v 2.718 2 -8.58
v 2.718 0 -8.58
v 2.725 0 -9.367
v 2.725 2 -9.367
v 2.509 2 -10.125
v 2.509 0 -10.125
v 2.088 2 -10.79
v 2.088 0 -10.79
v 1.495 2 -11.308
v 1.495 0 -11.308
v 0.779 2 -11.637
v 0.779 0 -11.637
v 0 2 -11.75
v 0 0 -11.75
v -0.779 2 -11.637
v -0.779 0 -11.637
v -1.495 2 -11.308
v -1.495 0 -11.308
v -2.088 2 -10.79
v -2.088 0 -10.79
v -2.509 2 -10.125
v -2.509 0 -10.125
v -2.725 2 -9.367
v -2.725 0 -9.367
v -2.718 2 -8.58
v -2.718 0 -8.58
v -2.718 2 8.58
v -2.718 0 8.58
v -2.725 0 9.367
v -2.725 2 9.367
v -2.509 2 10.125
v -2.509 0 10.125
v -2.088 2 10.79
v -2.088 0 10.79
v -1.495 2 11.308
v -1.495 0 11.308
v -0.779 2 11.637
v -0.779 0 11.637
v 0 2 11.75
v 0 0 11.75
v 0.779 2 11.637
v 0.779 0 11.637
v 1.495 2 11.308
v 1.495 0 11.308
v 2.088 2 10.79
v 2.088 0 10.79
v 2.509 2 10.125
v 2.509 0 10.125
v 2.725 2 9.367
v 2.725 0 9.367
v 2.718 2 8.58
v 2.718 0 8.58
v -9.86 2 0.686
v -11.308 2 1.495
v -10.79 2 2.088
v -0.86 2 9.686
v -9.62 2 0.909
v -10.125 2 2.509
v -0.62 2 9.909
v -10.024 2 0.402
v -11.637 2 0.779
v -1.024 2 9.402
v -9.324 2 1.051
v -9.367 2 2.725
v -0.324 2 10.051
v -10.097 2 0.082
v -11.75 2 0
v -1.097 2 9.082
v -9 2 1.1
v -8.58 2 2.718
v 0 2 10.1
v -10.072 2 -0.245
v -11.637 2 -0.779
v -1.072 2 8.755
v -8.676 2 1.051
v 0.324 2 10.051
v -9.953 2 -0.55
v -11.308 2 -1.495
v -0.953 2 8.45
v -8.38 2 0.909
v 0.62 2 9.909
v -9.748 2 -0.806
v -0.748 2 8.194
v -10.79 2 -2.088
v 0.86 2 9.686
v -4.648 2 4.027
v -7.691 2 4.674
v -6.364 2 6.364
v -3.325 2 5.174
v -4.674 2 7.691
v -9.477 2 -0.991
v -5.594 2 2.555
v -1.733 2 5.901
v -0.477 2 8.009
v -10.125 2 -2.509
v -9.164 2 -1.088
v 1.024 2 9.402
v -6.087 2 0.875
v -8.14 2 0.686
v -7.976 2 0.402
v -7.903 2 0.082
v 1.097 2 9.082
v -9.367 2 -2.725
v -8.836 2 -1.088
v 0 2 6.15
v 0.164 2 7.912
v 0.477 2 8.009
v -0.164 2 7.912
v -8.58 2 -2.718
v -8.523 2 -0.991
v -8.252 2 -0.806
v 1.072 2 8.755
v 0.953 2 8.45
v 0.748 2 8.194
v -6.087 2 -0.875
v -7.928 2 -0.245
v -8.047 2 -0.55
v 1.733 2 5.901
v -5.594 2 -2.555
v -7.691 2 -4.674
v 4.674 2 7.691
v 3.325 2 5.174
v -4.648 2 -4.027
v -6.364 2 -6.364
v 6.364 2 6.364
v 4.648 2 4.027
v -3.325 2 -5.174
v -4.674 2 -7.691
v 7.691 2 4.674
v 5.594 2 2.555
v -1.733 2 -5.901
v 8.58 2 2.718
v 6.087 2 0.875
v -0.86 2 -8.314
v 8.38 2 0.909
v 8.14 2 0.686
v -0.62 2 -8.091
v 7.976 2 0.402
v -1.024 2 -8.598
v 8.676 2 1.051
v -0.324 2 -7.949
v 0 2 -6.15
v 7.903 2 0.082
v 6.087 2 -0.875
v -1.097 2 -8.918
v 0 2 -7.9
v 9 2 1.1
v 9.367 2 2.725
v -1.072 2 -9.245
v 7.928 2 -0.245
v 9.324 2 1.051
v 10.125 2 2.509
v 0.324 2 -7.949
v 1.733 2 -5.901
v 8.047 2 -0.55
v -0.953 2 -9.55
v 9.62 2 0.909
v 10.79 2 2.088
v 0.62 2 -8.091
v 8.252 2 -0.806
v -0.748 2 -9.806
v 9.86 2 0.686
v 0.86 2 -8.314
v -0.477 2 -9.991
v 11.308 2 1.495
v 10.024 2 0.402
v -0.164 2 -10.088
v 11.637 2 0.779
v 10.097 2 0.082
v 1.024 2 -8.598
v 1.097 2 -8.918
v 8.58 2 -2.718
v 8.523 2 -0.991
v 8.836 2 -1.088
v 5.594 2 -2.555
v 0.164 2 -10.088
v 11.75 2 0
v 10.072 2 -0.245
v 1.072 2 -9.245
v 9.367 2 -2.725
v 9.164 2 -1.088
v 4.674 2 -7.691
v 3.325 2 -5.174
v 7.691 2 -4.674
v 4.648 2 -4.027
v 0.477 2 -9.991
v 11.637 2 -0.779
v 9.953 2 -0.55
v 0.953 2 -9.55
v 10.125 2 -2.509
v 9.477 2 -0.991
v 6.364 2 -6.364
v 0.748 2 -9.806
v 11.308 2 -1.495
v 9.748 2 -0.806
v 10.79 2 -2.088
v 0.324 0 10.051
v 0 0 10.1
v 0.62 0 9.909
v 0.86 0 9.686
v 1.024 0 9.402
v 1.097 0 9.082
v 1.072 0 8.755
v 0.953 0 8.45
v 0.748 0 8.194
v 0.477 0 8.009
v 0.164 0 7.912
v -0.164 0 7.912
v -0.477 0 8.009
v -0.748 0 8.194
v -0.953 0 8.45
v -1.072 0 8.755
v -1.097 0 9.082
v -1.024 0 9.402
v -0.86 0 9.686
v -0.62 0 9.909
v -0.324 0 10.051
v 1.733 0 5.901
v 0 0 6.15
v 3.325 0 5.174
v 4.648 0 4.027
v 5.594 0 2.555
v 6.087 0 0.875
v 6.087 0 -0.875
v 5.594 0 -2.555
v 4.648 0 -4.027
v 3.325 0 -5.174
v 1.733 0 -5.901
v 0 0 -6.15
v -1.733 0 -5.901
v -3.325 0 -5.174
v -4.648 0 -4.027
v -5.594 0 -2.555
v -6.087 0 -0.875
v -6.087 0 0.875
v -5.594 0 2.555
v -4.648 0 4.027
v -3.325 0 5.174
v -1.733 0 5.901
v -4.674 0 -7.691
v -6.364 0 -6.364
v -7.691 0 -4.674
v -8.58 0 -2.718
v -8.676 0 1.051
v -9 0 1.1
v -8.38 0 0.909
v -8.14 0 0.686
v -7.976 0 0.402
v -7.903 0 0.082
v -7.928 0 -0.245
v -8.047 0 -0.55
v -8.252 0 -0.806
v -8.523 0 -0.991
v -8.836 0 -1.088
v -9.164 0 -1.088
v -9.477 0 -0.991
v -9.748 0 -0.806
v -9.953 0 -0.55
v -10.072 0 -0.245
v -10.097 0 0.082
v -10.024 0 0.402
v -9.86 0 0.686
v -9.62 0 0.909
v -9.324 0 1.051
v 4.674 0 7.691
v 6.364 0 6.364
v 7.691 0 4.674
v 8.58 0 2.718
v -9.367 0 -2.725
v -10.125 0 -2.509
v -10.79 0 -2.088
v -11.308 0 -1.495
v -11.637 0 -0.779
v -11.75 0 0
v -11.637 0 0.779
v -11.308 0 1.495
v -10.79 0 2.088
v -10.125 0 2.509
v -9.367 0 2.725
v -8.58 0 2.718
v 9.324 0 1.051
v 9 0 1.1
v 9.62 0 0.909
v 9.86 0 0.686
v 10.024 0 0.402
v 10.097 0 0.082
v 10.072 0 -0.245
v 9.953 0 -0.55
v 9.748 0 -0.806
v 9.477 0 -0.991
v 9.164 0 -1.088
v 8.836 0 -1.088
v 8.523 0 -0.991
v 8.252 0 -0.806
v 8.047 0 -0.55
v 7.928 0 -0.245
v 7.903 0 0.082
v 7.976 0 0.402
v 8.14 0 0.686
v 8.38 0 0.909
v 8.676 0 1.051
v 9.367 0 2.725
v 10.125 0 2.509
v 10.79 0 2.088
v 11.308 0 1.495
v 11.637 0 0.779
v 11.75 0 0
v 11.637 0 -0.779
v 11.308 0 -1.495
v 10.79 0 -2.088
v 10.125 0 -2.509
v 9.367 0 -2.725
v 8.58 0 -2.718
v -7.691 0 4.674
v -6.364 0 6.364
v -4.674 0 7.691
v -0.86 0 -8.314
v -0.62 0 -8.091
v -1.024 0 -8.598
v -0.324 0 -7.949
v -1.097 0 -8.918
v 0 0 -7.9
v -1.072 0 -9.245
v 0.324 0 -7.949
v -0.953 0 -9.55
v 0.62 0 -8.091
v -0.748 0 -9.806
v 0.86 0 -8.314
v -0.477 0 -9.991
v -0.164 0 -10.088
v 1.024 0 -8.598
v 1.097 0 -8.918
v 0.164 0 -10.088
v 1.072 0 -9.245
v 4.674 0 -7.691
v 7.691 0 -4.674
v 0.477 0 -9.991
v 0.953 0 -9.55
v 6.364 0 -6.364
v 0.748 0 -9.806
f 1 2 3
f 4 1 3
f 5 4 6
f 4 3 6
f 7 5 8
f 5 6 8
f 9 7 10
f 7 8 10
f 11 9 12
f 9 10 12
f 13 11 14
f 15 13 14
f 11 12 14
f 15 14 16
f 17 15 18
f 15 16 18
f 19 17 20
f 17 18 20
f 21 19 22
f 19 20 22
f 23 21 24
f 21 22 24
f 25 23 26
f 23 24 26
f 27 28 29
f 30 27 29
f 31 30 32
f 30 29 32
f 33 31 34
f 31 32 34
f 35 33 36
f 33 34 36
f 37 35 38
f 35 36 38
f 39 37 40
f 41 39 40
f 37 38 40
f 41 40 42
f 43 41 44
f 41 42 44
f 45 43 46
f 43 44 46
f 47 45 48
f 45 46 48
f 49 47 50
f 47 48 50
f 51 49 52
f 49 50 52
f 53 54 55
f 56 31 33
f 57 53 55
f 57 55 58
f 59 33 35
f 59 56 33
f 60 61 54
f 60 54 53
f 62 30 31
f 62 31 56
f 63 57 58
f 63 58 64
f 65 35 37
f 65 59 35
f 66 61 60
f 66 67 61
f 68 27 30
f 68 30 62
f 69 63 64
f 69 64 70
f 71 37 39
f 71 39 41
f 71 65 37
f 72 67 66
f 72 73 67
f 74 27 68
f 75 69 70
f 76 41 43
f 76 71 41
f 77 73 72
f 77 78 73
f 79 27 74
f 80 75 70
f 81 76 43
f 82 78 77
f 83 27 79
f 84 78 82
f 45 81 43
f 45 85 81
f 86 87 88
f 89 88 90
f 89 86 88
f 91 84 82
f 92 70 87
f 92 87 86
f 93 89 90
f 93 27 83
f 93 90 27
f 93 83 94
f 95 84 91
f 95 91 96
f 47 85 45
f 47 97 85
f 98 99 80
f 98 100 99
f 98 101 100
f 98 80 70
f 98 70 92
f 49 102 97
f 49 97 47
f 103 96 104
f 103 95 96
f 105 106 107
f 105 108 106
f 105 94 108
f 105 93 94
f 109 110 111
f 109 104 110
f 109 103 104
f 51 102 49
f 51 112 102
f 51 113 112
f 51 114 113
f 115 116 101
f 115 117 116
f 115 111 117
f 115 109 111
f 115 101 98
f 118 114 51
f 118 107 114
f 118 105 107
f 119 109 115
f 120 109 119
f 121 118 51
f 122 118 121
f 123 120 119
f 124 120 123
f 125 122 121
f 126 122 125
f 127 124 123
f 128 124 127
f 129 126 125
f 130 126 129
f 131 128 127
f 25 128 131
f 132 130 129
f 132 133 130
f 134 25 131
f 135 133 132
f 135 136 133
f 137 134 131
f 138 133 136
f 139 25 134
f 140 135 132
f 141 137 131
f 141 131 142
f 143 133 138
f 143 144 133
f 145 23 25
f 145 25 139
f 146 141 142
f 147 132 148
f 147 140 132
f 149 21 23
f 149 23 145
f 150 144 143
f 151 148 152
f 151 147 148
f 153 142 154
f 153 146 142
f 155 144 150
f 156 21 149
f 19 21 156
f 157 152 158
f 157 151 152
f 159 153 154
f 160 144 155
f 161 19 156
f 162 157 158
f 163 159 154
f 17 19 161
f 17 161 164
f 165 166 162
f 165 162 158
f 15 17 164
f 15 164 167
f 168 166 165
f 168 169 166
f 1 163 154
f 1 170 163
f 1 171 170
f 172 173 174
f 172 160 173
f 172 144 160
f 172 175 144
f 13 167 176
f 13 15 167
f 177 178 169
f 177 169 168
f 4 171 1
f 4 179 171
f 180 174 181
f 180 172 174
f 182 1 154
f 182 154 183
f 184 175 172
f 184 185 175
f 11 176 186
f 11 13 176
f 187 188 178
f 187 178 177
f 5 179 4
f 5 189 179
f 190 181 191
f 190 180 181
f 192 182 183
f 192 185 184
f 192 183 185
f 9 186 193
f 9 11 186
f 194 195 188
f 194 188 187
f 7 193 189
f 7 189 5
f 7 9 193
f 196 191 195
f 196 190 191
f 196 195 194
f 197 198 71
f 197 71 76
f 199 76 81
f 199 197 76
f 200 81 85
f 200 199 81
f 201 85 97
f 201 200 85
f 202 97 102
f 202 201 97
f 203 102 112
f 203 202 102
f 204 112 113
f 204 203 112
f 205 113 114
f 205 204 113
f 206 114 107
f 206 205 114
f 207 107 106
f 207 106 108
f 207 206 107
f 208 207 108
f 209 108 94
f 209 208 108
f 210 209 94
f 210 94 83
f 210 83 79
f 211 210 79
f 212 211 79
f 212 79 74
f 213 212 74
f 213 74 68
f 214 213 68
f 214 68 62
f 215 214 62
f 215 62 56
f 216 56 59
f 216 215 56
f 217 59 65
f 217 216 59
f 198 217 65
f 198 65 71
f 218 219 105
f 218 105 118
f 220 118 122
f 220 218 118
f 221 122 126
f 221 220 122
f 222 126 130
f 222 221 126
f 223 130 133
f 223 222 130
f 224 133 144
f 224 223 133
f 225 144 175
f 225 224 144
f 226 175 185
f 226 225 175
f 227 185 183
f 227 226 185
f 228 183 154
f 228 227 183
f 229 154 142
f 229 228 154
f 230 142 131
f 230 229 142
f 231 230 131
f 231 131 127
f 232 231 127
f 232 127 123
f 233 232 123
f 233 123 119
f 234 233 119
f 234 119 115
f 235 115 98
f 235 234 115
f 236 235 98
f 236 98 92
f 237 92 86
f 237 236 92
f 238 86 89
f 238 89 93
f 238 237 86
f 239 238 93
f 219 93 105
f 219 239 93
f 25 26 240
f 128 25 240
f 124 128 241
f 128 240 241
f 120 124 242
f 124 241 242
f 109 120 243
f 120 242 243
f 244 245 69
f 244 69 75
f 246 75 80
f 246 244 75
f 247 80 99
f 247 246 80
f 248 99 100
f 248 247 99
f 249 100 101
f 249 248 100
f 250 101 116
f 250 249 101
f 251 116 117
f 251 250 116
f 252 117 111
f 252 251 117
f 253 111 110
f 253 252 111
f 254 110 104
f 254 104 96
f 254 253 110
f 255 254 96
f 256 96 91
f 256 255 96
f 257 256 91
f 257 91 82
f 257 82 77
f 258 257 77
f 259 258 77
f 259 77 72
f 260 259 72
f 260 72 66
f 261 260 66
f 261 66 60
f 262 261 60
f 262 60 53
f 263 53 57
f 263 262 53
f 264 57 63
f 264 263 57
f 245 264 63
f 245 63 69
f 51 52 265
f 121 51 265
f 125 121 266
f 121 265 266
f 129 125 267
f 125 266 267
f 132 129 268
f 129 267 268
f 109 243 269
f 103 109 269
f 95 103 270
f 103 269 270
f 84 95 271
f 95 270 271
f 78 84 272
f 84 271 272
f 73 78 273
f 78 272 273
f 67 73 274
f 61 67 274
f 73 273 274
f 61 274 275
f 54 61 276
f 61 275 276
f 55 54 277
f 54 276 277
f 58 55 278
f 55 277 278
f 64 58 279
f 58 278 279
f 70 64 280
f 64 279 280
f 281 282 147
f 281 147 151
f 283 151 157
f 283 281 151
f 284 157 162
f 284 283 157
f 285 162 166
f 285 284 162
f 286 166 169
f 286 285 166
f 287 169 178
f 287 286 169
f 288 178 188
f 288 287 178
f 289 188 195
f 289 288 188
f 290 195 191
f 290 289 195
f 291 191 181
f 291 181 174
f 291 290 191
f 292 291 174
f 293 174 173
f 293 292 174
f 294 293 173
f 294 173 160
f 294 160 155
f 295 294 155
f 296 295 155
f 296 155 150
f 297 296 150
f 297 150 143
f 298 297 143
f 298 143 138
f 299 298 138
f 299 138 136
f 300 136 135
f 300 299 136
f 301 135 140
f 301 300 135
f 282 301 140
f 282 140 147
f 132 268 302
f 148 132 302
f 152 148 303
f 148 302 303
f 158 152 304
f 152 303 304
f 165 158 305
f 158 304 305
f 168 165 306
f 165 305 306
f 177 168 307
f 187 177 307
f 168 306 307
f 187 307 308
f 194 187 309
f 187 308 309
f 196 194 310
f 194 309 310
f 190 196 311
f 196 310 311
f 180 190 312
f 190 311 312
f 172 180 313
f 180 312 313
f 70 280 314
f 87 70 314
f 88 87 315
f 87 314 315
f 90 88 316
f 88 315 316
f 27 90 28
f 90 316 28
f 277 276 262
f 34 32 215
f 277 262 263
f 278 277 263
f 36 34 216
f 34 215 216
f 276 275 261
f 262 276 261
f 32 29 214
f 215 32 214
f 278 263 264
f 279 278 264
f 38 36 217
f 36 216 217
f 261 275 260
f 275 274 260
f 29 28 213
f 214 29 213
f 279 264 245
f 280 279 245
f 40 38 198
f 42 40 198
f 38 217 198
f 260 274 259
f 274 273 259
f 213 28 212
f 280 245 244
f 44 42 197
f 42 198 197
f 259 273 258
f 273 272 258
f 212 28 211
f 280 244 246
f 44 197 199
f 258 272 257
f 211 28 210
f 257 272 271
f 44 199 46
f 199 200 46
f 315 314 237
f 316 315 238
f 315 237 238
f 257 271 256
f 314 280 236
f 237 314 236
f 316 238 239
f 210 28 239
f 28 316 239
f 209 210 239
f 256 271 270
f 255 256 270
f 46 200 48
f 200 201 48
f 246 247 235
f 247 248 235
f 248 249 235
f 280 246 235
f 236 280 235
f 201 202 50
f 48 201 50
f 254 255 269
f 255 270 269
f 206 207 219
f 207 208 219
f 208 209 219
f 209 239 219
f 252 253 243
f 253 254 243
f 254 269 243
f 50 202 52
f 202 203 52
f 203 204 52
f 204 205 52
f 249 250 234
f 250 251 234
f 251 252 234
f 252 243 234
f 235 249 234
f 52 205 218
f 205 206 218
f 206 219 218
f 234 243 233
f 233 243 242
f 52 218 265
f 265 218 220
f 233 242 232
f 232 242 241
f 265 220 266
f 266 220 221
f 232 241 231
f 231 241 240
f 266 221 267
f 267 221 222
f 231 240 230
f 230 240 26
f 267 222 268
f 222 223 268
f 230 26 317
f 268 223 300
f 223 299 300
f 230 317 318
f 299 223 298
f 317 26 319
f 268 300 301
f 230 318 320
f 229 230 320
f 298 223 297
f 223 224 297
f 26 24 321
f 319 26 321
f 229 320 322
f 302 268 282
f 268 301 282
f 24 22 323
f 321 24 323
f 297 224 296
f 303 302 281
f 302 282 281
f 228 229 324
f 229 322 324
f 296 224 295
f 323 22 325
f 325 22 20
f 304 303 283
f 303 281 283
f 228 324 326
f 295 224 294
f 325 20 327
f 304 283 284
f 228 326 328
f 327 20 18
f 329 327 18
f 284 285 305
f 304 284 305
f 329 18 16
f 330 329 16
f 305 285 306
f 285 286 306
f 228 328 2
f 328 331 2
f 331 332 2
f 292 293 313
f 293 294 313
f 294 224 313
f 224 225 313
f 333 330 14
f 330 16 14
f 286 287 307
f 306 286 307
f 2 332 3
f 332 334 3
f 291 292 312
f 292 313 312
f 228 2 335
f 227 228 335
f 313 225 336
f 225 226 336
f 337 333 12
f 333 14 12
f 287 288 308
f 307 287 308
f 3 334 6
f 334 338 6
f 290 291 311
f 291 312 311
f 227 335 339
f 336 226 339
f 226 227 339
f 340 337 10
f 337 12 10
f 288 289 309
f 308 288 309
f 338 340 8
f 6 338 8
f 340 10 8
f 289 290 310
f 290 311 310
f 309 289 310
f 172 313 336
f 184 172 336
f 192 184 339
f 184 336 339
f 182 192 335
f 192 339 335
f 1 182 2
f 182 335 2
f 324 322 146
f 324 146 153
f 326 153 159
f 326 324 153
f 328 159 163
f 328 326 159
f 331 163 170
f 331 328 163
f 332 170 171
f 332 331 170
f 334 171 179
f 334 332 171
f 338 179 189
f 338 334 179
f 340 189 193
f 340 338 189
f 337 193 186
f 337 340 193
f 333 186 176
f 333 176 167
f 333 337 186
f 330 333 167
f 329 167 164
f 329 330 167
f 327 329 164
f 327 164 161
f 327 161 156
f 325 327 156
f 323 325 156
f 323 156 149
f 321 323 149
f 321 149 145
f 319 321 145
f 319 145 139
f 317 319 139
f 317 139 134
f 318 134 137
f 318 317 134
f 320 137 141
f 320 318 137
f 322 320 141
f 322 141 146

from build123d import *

# Parameters (mm, degrees)
SKETCH1_R           = 1.1
SKETCH1_R_2         = 6.15
BOSS_EXTRUDE1_DEPTH = 2


with BuildPart() as part:
    # Sketch1 → Boss-Extrude1 (new body)
    with BuildSketch(Plane(origin=(0, 0, 0), x_dir=(1, 0, 0), z_dir=(0, 1, 0))):
        with BuildLine():
            ThreePointArc((-2.717716562, -8.579861111), (0, -11.75), (2.717716562, -8.579861111))
            ThreePointArc((2.717716562, -8.579861111), (6.363961031, -6.363961031), (8.579861111, -2.717716562))
            ThreePointArc((8.579861111, -2.717716562), (11.75, 0), (8.579861111, 2.717716562))
            ThreePointArc((8.579861111, 2.717716562), (6.363961031, 6.363961031), (2.717716562, 8.579861111))
            ThreePointArc((2.717716562, 8.579861111), (0, 11.75), (-2.717716562, 8.579861111))
            ThreePointArc((-2.717716562, 8.579861111), (-6.363961031, 6.363961031), (-8.579861111, 2.717716562))
            ThreePointArc((-8.579861111, 2.717716562), (-11.75, 0), (-8.579861111, -2.717716562))
            ThreePointArc((-8.579861111, -2.717716562), (-6.363961031, -6.363961031), (-2.717716562, -8.579861111))
        make_face()
        with Locations(Location((0, -9, 0), (0, 0, 270))):
            Circle(SKETCH1_R, mode=Mode.SUBTRACT)
        with Locations(Location((-9, 0, 0), (0, 0, 270))):
            Circle(SKETCH1_R, mode=Mode.SUBTRACT)
        with Locations(Location((0, 0, 0), (0, 0, 270))):
            Circle(SKETCH1_R_2, mode=Mode.SUBTRACT)
        with Locations(Location((9, 0, 0), (0, 0, 270))):
            Circle(SKETCH1_R, mode=Mode.SUBTRACT)
        with Locations(Location((0, 9, 0), (0, 0, 270))):
            Circle(SKETCH1_R, mode=Mode.SUBTRACT)
    extrude(amount=BOSS_EXTRUDE1_DEPTH)


solid = part.part
